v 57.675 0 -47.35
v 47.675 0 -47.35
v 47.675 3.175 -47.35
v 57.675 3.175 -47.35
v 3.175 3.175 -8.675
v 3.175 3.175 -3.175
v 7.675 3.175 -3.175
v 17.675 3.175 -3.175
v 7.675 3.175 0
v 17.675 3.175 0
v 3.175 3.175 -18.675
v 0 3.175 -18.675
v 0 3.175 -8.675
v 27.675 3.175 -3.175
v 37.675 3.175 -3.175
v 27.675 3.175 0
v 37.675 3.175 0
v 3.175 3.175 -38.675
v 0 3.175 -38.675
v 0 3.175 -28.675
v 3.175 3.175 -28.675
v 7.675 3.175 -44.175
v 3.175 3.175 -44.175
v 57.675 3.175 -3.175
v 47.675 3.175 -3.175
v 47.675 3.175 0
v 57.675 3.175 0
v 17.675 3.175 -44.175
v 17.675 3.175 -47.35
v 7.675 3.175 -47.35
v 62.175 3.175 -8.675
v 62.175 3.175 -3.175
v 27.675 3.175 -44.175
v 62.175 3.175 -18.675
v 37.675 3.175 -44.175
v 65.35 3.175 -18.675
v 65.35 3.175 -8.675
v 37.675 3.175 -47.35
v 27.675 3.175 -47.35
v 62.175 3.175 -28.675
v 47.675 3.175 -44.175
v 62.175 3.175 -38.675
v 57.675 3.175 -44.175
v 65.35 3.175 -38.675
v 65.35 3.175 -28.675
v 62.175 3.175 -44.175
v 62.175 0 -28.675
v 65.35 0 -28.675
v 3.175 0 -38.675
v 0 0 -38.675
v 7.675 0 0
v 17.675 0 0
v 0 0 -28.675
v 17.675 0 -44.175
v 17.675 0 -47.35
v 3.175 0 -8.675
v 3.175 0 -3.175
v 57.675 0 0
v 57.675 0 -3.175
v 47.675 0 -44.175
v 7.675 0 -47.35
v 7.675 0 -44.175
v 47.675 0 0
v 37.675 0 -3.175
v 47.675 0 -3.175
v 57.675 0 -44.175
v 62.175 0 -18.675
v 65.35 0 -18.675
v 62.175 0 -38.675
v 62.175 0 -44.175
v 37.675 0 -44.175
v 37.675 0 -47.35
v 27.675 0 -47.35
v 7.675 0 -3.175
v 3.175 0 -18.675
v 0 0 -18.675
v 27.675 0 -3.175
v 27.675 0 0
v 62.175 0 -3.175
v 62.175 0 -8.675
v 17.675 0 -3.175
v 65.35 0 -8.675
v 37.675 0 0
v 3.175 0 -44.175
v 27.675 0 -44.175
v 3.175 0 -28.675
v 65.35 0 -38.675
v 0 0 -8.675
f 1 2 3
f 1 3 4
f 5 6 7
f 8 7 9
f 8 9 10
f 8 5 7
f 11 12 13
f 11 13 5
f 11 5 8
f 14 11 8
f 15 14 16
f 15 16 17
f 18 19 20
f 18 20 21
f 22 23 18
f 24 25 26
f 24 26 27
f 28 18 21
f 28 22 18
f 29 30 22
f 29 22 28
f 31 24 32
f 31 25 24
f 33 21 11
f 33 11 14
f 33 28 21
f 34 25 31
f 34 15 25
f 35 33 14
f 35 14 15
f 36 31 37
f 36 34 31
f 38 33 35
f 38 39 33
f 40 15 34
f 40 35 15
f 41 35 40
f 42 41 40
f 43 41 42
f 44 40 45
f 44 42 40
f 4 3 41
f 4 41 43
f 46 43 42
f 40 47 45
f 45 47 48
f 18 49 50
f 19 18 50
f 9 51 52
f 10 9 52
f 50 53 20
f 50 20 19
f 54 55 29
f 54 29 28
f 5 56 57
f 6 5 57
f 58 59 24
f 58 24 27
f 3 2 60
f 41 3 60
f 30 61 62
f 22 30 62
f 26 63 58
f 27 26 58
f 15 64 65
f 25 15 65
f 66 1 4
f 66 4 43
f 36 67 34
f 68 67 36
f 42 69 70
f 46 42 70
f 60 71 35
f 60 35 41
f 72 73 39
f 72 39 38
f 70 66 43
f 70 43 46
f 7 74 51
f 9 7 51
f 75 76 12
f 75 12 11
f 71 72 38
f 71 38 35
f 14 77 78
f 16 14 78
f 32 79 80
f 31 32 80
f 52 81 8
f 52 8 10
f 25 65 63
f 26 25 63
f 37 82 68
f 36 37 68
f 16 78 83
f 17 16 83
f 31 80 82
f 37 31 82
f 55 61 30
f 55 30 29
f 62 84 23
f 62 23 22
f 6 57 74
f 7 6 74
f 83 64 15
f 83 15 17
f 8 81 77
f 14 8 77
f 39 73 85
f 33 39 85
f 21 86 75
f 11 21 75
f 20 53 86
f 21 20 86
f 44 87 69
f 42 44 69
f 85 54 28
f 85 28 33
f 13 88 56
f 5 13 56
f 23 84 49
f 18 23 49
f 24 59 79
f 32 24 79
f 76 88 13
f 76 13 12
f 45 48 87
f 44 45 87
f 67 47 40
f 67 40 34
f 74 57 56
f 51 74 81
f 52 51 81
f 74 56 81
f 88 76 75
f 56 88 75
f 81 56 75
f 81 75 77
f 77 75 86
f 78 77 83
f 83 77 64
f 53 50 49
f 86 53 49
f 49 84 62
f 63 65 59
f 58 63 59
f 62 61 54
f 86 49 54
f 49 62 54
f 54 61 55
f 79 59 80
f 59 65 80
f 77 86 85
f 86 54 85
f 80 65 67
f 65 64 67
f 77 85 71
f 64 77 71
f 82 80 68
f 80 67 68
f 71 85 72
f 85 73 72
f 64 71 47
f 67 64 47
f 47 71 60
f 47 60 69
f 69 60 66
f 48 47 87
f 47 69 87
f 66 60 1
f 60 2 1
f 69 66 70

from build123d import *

# Parameters (mm, degrees)
SKETCH1_W           = 65.35
SKETCH1_H           = 47.35
BOSS_EXTRUDE1_DEPTH = 3.175
SKETCH2_W           = 4.5
SKETCH2_H           = 3.175
SKETCH2_W_2         = 3.175
SKETCH2_H_2         = 10
SKETCH2_W_3         = 10
CUT_EXTRUDE1_DEPTH  = 4.175


with BuildPart() as part:
    # Sketch1 → Boss-Extrude1 (new body)
    with BuildSketch(Plane(origin=(0, 0, 0), x_dir=(1, 0, 0), z_dir=(0, 1, 0))):
        with Locations((32.675, 23.675)):
            Rectangle(SKETCH1_W, SKETCH1_H)
    extrude(amount=BOSS_EXTRUDE1_DEPTH)

    # Sketch2 → Cut-Extrude1 (cut, through all)
    with BuildSketch(Plane.XZ):
        with Locations((59.925, -45.7625)):
            Rectangle(SKETCH2_W, SKETCH2_H)
        Polygon((65.35, -38.675), (62.175, -38.675), (62.175, -44.175), (62.175, -47.35), (65.35, -47.35), align=None)
        with Locations((63.7625, -23.675)):
            Rectangle(SKETCH2_W_2, SKETCH2_H_2)
        Polygon((62.175, -8.675), (65.35, -8.675), (65.35, 0), (62.175, 0), (62.175, -3.175), align=None)
        with Locations((59.925, -1.5875)):
            Rectangle(SKETCH2_W, SKETCH2_H)
        with Locations((42.675, -1.5875)):
            Rectangle(SKETCH2_W_3, SKETCH2_H)
        with Locations((42.675, -45.7625)):
            Rectangle(SKETCH2_W_3, SKETCH2_H)
        with Locations((22.675, -45.7625)):
            Rectangle(SKETCH2_W_3, SKETCH2_H)
        with Locations((5.425, -45.7625)):
            Rectangle(SKETCH2_W, SKETCH2_H)
        Polygon((0, -47.35), (3.175, -47.35), (3.175, -44.175), (3.175, -38.675), (0, -38.675), align=None)
        with Locations((1.5875, -23.675)):
            Rectangle(SKETCH2_W_2, SKETCH2_H_2)
        Polygon((3.175, -3.175), (3.175, 0), (0, 0), (0, -8.675), (3.175, -8.675), align=None)
        with Locations((5.425, -1.5875)):
            Rectangle(SKETCH2_W, SKETCH2_H)
        with Locations((22.675, -1.5875)):
            Rectangle(SKETCH2_W_3, SKETCH2_H)
    extrude(amount=-CUT_EXTRUDE1_DEPTH, mode=Mode.SUBTRACT)


solid = part.part
